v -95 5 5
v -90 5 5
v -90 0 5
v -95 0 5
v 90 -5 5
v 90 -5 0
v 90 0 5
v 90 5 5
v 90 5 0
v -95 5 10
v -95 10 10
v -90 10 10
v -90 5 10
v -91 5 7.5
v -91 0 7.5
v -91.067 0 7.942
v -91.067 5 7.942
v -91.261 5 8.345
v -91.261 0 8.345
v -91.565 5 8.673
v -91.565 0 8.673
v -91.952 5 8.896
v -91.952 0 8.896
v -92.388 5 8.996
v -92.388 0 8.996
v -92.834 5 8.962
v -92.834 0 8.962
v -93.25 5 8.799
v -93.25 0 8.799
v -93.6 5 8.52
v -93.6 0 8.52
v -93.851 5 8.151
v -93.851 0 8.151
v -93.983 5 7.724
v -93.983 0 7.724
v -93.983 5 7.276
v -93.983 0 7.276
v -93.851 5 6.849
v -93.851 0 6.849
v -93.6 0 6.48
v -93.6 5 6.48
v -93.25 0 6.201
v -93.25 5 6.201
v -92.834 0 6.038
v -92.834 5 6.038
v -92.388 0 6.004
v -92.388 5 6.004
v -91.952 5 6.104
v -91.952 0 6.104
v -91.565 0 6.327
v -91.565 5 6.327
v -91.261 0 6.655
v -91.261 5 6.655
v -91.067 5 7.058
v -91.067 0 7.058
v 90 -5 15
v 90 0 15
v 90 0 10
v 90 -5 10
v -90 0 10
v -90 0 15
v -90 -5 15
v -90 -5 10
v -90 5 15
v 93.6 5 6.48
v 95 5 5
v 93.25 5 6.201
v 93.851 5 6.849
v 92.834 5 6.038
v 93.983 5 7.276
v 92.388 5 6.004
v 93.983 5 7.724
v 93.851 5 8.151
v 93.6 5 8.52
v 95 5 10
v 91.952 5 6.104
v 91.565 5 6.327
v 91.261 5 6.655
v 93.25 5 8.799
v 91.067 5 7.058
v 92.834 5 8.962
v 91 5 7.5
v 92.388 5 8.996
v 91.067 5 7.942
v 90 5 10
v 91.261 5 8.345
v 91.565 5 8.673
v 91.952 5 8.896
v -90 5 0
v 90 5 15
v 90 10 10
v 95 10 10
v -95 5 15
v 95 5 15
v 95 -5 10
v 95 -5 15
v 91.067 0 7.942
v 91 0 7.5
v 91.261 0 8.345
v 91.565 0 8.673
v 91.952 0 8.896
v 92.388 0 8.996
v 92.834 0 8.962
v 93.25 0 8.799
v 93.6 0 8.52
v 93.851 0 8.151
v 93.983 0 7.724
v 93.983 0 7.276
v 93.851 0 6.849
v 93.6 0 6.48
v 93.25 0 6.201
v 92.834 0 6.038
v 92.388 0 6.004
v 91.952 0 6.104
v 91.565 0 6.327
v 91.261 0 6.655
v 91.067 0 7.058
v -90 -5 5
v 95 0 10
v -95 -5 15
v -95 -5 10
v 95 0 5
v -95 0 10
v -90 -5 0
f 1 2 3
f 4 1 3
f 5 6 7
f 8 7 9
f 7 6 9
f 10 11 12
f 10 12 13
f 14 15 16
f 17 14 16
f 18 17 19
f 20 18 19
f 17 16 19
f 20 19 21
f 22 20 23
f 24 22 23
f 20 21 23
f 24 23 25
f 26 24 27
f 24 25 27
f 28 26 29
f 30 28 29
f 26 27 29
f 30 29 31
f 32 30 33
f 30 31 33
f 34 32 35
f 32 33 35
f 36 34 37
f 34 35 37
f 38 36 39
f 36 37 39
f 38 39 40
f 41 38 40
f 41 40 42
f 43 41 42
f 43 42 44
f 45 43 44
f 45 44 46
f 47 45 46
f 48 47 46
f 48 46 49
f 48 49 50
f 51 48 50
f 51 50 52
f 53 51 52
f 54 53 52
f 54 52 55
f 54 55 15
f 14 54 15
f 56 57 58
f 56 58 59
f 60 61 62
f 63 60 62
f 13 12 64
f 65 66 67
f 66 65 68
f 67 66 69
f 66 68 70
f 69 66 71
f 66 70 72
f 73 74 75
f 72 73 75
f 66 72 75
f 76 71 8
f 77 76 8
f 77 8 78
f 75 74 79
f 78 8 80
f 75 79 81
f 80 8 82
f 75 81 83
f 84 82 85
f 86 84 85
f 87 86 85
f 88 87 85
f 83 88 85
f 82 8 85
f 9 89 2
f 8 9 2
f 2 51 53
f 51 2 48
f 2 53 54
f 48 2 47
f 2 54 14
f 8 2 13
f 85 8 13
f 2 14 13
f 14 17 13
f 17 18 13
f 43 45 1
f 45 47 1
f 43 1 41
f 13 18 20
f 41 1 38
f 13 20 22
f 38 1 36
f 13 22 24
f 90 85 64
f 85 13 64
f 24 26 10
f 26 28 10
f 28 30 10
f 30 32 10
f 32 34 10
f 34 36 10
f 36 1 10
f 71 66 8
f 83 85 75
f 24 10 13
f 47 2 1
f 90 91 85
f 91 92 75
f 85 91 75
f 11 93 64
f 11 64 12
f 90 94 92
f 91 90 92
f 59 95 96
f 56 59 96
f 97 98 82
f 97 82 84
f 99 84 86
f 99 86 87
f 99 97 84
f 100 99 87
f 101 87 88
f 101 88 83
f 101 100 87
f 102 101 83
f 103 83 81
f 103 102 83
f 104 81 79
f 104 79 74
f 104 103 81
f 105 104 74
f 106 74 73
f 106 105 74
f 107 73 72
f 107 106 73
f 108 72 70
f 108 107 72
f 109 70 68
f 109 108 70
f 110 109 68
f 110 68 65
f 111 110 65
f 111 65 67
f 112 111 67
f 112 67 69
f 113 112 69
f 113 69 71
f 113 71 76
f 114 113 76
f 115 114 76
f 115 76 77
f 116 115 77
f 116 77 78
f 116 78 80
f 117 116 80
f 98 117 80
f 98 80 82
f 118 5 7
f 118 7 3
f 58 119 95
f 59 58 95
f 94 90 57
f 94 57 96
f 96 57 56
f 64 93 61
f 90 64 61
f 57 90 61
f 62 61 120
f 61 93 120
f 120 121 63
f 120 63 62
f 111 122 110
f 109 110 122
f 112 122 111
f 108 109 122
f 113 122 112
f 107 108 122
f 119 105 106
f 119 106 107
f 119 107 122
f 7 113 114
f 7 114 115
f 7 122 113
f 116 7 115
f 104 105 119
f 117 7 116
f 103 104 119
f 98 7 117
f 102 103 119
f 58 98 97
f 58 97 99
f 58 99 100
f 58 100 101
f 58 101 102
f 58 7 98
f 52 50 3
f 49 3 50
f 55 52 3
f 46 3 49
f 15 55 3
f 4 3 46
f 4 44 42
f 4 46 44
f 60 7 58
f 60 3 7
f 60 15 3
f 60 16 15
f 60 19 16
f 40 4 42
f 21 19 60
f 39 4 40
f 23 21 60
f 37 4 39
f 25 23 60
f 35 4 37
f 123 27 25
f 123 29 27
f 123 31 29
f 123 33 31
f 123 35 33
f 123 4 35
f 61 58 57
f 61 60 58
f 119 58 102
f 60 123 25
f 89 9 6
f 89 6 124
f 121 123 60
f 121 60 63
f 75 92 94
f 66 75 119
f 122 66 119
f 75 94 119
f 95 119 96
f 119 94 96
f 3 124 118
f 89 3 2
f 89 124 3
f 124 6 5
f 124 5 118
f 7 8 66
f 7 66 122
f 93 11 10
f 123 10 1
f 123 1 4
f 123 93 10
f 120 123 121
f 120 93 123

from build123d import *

# Parameters (mm, degrees)
F0_W      = 180
F0_H      = 10
F1_DEPTH  = 15
F2_W      = 180
F2_H      = 10
F3_DEPTH  = 5
F4_W      = 5
F4_H      = 10
F5_DEPTH  = 5
F6_R      = 1.5
F7_DEPTH  = 25
F8_W      = 90
F8_H      = 10
F9_DEPTH  = 25
F10_W     = 5
F10_H     = 5
F11_DEPTH = 5


with BuildPart() as f1:
    # F0 (on Top) → F1 (new body)
    with BuildSketch(Plane.XY):
        Rectangle(F0_W, F0_H)
    extrude(amount=F1_DEPTH)

    # F2 (on face) → F3 (cut)
    with BuildSketch(Plane.XZ.offset(5)):
        with Locations((0, 10)):
            Rectangle(F2_W, F2_H)
    extrude(amount=-F3_DEPTH, mode=Mode.SUBTRACT)

    # F4 (on face) → F5 (join)
    with BuildSketch(Plane(origin=(-90, 0, 0), x_dir=(0, -1, 0), z_dir=(-1, 0, 0))):
        with Locations((-2.5, 10)):
            Rectangle(F4_W, F4_H)
    extrude(amount=F5_DEPTH)

    # F6 (on face) → F7 (cut)
    with BuildSketch(Plane.XZ):
        with Locations((-92.5, 7.5)):
            Circle(F6_R)
    extrude(amount=-F7_DEPTH, mode=Mode.SUBTRACT)

    # F8 (on face) → F9 (cut)
    with BuildSketch(Plane(origin=(0, 0, 0), x_dir=(1, 0, 0), z_dir=(0, 0, -1))):
        with Locations((45, 0)):
            Rectangle(F8_W, F8_H)
    extrude(amount=-F9_DEPTH, mode=Mode.SUBTRACT)

    # F10 (on face) → F11 (join)
    with BuildSketch(Plane(origin=(-95, 0, 0), x_dir=(0, -1, 0), z_dir=(-1, 0, 0))):
        Polygon((-5, 10), (-5, 15), (-10, 10), align=None)
        with Locations((2.5, 12.5)):
            Rectangle(F10_W, F10_H)
    extrude(amount=-F11_DEPTH)

    # F12: F1 across face


with BuildPart() as f1_1:
    add(f1.part)
    add(f1.part.mirror(Plane(origin=(0, 1.25, 6.25), x_dir=(0, 1, 0), z_dir=(1, 0, 0))))


solid = f1_1.part
